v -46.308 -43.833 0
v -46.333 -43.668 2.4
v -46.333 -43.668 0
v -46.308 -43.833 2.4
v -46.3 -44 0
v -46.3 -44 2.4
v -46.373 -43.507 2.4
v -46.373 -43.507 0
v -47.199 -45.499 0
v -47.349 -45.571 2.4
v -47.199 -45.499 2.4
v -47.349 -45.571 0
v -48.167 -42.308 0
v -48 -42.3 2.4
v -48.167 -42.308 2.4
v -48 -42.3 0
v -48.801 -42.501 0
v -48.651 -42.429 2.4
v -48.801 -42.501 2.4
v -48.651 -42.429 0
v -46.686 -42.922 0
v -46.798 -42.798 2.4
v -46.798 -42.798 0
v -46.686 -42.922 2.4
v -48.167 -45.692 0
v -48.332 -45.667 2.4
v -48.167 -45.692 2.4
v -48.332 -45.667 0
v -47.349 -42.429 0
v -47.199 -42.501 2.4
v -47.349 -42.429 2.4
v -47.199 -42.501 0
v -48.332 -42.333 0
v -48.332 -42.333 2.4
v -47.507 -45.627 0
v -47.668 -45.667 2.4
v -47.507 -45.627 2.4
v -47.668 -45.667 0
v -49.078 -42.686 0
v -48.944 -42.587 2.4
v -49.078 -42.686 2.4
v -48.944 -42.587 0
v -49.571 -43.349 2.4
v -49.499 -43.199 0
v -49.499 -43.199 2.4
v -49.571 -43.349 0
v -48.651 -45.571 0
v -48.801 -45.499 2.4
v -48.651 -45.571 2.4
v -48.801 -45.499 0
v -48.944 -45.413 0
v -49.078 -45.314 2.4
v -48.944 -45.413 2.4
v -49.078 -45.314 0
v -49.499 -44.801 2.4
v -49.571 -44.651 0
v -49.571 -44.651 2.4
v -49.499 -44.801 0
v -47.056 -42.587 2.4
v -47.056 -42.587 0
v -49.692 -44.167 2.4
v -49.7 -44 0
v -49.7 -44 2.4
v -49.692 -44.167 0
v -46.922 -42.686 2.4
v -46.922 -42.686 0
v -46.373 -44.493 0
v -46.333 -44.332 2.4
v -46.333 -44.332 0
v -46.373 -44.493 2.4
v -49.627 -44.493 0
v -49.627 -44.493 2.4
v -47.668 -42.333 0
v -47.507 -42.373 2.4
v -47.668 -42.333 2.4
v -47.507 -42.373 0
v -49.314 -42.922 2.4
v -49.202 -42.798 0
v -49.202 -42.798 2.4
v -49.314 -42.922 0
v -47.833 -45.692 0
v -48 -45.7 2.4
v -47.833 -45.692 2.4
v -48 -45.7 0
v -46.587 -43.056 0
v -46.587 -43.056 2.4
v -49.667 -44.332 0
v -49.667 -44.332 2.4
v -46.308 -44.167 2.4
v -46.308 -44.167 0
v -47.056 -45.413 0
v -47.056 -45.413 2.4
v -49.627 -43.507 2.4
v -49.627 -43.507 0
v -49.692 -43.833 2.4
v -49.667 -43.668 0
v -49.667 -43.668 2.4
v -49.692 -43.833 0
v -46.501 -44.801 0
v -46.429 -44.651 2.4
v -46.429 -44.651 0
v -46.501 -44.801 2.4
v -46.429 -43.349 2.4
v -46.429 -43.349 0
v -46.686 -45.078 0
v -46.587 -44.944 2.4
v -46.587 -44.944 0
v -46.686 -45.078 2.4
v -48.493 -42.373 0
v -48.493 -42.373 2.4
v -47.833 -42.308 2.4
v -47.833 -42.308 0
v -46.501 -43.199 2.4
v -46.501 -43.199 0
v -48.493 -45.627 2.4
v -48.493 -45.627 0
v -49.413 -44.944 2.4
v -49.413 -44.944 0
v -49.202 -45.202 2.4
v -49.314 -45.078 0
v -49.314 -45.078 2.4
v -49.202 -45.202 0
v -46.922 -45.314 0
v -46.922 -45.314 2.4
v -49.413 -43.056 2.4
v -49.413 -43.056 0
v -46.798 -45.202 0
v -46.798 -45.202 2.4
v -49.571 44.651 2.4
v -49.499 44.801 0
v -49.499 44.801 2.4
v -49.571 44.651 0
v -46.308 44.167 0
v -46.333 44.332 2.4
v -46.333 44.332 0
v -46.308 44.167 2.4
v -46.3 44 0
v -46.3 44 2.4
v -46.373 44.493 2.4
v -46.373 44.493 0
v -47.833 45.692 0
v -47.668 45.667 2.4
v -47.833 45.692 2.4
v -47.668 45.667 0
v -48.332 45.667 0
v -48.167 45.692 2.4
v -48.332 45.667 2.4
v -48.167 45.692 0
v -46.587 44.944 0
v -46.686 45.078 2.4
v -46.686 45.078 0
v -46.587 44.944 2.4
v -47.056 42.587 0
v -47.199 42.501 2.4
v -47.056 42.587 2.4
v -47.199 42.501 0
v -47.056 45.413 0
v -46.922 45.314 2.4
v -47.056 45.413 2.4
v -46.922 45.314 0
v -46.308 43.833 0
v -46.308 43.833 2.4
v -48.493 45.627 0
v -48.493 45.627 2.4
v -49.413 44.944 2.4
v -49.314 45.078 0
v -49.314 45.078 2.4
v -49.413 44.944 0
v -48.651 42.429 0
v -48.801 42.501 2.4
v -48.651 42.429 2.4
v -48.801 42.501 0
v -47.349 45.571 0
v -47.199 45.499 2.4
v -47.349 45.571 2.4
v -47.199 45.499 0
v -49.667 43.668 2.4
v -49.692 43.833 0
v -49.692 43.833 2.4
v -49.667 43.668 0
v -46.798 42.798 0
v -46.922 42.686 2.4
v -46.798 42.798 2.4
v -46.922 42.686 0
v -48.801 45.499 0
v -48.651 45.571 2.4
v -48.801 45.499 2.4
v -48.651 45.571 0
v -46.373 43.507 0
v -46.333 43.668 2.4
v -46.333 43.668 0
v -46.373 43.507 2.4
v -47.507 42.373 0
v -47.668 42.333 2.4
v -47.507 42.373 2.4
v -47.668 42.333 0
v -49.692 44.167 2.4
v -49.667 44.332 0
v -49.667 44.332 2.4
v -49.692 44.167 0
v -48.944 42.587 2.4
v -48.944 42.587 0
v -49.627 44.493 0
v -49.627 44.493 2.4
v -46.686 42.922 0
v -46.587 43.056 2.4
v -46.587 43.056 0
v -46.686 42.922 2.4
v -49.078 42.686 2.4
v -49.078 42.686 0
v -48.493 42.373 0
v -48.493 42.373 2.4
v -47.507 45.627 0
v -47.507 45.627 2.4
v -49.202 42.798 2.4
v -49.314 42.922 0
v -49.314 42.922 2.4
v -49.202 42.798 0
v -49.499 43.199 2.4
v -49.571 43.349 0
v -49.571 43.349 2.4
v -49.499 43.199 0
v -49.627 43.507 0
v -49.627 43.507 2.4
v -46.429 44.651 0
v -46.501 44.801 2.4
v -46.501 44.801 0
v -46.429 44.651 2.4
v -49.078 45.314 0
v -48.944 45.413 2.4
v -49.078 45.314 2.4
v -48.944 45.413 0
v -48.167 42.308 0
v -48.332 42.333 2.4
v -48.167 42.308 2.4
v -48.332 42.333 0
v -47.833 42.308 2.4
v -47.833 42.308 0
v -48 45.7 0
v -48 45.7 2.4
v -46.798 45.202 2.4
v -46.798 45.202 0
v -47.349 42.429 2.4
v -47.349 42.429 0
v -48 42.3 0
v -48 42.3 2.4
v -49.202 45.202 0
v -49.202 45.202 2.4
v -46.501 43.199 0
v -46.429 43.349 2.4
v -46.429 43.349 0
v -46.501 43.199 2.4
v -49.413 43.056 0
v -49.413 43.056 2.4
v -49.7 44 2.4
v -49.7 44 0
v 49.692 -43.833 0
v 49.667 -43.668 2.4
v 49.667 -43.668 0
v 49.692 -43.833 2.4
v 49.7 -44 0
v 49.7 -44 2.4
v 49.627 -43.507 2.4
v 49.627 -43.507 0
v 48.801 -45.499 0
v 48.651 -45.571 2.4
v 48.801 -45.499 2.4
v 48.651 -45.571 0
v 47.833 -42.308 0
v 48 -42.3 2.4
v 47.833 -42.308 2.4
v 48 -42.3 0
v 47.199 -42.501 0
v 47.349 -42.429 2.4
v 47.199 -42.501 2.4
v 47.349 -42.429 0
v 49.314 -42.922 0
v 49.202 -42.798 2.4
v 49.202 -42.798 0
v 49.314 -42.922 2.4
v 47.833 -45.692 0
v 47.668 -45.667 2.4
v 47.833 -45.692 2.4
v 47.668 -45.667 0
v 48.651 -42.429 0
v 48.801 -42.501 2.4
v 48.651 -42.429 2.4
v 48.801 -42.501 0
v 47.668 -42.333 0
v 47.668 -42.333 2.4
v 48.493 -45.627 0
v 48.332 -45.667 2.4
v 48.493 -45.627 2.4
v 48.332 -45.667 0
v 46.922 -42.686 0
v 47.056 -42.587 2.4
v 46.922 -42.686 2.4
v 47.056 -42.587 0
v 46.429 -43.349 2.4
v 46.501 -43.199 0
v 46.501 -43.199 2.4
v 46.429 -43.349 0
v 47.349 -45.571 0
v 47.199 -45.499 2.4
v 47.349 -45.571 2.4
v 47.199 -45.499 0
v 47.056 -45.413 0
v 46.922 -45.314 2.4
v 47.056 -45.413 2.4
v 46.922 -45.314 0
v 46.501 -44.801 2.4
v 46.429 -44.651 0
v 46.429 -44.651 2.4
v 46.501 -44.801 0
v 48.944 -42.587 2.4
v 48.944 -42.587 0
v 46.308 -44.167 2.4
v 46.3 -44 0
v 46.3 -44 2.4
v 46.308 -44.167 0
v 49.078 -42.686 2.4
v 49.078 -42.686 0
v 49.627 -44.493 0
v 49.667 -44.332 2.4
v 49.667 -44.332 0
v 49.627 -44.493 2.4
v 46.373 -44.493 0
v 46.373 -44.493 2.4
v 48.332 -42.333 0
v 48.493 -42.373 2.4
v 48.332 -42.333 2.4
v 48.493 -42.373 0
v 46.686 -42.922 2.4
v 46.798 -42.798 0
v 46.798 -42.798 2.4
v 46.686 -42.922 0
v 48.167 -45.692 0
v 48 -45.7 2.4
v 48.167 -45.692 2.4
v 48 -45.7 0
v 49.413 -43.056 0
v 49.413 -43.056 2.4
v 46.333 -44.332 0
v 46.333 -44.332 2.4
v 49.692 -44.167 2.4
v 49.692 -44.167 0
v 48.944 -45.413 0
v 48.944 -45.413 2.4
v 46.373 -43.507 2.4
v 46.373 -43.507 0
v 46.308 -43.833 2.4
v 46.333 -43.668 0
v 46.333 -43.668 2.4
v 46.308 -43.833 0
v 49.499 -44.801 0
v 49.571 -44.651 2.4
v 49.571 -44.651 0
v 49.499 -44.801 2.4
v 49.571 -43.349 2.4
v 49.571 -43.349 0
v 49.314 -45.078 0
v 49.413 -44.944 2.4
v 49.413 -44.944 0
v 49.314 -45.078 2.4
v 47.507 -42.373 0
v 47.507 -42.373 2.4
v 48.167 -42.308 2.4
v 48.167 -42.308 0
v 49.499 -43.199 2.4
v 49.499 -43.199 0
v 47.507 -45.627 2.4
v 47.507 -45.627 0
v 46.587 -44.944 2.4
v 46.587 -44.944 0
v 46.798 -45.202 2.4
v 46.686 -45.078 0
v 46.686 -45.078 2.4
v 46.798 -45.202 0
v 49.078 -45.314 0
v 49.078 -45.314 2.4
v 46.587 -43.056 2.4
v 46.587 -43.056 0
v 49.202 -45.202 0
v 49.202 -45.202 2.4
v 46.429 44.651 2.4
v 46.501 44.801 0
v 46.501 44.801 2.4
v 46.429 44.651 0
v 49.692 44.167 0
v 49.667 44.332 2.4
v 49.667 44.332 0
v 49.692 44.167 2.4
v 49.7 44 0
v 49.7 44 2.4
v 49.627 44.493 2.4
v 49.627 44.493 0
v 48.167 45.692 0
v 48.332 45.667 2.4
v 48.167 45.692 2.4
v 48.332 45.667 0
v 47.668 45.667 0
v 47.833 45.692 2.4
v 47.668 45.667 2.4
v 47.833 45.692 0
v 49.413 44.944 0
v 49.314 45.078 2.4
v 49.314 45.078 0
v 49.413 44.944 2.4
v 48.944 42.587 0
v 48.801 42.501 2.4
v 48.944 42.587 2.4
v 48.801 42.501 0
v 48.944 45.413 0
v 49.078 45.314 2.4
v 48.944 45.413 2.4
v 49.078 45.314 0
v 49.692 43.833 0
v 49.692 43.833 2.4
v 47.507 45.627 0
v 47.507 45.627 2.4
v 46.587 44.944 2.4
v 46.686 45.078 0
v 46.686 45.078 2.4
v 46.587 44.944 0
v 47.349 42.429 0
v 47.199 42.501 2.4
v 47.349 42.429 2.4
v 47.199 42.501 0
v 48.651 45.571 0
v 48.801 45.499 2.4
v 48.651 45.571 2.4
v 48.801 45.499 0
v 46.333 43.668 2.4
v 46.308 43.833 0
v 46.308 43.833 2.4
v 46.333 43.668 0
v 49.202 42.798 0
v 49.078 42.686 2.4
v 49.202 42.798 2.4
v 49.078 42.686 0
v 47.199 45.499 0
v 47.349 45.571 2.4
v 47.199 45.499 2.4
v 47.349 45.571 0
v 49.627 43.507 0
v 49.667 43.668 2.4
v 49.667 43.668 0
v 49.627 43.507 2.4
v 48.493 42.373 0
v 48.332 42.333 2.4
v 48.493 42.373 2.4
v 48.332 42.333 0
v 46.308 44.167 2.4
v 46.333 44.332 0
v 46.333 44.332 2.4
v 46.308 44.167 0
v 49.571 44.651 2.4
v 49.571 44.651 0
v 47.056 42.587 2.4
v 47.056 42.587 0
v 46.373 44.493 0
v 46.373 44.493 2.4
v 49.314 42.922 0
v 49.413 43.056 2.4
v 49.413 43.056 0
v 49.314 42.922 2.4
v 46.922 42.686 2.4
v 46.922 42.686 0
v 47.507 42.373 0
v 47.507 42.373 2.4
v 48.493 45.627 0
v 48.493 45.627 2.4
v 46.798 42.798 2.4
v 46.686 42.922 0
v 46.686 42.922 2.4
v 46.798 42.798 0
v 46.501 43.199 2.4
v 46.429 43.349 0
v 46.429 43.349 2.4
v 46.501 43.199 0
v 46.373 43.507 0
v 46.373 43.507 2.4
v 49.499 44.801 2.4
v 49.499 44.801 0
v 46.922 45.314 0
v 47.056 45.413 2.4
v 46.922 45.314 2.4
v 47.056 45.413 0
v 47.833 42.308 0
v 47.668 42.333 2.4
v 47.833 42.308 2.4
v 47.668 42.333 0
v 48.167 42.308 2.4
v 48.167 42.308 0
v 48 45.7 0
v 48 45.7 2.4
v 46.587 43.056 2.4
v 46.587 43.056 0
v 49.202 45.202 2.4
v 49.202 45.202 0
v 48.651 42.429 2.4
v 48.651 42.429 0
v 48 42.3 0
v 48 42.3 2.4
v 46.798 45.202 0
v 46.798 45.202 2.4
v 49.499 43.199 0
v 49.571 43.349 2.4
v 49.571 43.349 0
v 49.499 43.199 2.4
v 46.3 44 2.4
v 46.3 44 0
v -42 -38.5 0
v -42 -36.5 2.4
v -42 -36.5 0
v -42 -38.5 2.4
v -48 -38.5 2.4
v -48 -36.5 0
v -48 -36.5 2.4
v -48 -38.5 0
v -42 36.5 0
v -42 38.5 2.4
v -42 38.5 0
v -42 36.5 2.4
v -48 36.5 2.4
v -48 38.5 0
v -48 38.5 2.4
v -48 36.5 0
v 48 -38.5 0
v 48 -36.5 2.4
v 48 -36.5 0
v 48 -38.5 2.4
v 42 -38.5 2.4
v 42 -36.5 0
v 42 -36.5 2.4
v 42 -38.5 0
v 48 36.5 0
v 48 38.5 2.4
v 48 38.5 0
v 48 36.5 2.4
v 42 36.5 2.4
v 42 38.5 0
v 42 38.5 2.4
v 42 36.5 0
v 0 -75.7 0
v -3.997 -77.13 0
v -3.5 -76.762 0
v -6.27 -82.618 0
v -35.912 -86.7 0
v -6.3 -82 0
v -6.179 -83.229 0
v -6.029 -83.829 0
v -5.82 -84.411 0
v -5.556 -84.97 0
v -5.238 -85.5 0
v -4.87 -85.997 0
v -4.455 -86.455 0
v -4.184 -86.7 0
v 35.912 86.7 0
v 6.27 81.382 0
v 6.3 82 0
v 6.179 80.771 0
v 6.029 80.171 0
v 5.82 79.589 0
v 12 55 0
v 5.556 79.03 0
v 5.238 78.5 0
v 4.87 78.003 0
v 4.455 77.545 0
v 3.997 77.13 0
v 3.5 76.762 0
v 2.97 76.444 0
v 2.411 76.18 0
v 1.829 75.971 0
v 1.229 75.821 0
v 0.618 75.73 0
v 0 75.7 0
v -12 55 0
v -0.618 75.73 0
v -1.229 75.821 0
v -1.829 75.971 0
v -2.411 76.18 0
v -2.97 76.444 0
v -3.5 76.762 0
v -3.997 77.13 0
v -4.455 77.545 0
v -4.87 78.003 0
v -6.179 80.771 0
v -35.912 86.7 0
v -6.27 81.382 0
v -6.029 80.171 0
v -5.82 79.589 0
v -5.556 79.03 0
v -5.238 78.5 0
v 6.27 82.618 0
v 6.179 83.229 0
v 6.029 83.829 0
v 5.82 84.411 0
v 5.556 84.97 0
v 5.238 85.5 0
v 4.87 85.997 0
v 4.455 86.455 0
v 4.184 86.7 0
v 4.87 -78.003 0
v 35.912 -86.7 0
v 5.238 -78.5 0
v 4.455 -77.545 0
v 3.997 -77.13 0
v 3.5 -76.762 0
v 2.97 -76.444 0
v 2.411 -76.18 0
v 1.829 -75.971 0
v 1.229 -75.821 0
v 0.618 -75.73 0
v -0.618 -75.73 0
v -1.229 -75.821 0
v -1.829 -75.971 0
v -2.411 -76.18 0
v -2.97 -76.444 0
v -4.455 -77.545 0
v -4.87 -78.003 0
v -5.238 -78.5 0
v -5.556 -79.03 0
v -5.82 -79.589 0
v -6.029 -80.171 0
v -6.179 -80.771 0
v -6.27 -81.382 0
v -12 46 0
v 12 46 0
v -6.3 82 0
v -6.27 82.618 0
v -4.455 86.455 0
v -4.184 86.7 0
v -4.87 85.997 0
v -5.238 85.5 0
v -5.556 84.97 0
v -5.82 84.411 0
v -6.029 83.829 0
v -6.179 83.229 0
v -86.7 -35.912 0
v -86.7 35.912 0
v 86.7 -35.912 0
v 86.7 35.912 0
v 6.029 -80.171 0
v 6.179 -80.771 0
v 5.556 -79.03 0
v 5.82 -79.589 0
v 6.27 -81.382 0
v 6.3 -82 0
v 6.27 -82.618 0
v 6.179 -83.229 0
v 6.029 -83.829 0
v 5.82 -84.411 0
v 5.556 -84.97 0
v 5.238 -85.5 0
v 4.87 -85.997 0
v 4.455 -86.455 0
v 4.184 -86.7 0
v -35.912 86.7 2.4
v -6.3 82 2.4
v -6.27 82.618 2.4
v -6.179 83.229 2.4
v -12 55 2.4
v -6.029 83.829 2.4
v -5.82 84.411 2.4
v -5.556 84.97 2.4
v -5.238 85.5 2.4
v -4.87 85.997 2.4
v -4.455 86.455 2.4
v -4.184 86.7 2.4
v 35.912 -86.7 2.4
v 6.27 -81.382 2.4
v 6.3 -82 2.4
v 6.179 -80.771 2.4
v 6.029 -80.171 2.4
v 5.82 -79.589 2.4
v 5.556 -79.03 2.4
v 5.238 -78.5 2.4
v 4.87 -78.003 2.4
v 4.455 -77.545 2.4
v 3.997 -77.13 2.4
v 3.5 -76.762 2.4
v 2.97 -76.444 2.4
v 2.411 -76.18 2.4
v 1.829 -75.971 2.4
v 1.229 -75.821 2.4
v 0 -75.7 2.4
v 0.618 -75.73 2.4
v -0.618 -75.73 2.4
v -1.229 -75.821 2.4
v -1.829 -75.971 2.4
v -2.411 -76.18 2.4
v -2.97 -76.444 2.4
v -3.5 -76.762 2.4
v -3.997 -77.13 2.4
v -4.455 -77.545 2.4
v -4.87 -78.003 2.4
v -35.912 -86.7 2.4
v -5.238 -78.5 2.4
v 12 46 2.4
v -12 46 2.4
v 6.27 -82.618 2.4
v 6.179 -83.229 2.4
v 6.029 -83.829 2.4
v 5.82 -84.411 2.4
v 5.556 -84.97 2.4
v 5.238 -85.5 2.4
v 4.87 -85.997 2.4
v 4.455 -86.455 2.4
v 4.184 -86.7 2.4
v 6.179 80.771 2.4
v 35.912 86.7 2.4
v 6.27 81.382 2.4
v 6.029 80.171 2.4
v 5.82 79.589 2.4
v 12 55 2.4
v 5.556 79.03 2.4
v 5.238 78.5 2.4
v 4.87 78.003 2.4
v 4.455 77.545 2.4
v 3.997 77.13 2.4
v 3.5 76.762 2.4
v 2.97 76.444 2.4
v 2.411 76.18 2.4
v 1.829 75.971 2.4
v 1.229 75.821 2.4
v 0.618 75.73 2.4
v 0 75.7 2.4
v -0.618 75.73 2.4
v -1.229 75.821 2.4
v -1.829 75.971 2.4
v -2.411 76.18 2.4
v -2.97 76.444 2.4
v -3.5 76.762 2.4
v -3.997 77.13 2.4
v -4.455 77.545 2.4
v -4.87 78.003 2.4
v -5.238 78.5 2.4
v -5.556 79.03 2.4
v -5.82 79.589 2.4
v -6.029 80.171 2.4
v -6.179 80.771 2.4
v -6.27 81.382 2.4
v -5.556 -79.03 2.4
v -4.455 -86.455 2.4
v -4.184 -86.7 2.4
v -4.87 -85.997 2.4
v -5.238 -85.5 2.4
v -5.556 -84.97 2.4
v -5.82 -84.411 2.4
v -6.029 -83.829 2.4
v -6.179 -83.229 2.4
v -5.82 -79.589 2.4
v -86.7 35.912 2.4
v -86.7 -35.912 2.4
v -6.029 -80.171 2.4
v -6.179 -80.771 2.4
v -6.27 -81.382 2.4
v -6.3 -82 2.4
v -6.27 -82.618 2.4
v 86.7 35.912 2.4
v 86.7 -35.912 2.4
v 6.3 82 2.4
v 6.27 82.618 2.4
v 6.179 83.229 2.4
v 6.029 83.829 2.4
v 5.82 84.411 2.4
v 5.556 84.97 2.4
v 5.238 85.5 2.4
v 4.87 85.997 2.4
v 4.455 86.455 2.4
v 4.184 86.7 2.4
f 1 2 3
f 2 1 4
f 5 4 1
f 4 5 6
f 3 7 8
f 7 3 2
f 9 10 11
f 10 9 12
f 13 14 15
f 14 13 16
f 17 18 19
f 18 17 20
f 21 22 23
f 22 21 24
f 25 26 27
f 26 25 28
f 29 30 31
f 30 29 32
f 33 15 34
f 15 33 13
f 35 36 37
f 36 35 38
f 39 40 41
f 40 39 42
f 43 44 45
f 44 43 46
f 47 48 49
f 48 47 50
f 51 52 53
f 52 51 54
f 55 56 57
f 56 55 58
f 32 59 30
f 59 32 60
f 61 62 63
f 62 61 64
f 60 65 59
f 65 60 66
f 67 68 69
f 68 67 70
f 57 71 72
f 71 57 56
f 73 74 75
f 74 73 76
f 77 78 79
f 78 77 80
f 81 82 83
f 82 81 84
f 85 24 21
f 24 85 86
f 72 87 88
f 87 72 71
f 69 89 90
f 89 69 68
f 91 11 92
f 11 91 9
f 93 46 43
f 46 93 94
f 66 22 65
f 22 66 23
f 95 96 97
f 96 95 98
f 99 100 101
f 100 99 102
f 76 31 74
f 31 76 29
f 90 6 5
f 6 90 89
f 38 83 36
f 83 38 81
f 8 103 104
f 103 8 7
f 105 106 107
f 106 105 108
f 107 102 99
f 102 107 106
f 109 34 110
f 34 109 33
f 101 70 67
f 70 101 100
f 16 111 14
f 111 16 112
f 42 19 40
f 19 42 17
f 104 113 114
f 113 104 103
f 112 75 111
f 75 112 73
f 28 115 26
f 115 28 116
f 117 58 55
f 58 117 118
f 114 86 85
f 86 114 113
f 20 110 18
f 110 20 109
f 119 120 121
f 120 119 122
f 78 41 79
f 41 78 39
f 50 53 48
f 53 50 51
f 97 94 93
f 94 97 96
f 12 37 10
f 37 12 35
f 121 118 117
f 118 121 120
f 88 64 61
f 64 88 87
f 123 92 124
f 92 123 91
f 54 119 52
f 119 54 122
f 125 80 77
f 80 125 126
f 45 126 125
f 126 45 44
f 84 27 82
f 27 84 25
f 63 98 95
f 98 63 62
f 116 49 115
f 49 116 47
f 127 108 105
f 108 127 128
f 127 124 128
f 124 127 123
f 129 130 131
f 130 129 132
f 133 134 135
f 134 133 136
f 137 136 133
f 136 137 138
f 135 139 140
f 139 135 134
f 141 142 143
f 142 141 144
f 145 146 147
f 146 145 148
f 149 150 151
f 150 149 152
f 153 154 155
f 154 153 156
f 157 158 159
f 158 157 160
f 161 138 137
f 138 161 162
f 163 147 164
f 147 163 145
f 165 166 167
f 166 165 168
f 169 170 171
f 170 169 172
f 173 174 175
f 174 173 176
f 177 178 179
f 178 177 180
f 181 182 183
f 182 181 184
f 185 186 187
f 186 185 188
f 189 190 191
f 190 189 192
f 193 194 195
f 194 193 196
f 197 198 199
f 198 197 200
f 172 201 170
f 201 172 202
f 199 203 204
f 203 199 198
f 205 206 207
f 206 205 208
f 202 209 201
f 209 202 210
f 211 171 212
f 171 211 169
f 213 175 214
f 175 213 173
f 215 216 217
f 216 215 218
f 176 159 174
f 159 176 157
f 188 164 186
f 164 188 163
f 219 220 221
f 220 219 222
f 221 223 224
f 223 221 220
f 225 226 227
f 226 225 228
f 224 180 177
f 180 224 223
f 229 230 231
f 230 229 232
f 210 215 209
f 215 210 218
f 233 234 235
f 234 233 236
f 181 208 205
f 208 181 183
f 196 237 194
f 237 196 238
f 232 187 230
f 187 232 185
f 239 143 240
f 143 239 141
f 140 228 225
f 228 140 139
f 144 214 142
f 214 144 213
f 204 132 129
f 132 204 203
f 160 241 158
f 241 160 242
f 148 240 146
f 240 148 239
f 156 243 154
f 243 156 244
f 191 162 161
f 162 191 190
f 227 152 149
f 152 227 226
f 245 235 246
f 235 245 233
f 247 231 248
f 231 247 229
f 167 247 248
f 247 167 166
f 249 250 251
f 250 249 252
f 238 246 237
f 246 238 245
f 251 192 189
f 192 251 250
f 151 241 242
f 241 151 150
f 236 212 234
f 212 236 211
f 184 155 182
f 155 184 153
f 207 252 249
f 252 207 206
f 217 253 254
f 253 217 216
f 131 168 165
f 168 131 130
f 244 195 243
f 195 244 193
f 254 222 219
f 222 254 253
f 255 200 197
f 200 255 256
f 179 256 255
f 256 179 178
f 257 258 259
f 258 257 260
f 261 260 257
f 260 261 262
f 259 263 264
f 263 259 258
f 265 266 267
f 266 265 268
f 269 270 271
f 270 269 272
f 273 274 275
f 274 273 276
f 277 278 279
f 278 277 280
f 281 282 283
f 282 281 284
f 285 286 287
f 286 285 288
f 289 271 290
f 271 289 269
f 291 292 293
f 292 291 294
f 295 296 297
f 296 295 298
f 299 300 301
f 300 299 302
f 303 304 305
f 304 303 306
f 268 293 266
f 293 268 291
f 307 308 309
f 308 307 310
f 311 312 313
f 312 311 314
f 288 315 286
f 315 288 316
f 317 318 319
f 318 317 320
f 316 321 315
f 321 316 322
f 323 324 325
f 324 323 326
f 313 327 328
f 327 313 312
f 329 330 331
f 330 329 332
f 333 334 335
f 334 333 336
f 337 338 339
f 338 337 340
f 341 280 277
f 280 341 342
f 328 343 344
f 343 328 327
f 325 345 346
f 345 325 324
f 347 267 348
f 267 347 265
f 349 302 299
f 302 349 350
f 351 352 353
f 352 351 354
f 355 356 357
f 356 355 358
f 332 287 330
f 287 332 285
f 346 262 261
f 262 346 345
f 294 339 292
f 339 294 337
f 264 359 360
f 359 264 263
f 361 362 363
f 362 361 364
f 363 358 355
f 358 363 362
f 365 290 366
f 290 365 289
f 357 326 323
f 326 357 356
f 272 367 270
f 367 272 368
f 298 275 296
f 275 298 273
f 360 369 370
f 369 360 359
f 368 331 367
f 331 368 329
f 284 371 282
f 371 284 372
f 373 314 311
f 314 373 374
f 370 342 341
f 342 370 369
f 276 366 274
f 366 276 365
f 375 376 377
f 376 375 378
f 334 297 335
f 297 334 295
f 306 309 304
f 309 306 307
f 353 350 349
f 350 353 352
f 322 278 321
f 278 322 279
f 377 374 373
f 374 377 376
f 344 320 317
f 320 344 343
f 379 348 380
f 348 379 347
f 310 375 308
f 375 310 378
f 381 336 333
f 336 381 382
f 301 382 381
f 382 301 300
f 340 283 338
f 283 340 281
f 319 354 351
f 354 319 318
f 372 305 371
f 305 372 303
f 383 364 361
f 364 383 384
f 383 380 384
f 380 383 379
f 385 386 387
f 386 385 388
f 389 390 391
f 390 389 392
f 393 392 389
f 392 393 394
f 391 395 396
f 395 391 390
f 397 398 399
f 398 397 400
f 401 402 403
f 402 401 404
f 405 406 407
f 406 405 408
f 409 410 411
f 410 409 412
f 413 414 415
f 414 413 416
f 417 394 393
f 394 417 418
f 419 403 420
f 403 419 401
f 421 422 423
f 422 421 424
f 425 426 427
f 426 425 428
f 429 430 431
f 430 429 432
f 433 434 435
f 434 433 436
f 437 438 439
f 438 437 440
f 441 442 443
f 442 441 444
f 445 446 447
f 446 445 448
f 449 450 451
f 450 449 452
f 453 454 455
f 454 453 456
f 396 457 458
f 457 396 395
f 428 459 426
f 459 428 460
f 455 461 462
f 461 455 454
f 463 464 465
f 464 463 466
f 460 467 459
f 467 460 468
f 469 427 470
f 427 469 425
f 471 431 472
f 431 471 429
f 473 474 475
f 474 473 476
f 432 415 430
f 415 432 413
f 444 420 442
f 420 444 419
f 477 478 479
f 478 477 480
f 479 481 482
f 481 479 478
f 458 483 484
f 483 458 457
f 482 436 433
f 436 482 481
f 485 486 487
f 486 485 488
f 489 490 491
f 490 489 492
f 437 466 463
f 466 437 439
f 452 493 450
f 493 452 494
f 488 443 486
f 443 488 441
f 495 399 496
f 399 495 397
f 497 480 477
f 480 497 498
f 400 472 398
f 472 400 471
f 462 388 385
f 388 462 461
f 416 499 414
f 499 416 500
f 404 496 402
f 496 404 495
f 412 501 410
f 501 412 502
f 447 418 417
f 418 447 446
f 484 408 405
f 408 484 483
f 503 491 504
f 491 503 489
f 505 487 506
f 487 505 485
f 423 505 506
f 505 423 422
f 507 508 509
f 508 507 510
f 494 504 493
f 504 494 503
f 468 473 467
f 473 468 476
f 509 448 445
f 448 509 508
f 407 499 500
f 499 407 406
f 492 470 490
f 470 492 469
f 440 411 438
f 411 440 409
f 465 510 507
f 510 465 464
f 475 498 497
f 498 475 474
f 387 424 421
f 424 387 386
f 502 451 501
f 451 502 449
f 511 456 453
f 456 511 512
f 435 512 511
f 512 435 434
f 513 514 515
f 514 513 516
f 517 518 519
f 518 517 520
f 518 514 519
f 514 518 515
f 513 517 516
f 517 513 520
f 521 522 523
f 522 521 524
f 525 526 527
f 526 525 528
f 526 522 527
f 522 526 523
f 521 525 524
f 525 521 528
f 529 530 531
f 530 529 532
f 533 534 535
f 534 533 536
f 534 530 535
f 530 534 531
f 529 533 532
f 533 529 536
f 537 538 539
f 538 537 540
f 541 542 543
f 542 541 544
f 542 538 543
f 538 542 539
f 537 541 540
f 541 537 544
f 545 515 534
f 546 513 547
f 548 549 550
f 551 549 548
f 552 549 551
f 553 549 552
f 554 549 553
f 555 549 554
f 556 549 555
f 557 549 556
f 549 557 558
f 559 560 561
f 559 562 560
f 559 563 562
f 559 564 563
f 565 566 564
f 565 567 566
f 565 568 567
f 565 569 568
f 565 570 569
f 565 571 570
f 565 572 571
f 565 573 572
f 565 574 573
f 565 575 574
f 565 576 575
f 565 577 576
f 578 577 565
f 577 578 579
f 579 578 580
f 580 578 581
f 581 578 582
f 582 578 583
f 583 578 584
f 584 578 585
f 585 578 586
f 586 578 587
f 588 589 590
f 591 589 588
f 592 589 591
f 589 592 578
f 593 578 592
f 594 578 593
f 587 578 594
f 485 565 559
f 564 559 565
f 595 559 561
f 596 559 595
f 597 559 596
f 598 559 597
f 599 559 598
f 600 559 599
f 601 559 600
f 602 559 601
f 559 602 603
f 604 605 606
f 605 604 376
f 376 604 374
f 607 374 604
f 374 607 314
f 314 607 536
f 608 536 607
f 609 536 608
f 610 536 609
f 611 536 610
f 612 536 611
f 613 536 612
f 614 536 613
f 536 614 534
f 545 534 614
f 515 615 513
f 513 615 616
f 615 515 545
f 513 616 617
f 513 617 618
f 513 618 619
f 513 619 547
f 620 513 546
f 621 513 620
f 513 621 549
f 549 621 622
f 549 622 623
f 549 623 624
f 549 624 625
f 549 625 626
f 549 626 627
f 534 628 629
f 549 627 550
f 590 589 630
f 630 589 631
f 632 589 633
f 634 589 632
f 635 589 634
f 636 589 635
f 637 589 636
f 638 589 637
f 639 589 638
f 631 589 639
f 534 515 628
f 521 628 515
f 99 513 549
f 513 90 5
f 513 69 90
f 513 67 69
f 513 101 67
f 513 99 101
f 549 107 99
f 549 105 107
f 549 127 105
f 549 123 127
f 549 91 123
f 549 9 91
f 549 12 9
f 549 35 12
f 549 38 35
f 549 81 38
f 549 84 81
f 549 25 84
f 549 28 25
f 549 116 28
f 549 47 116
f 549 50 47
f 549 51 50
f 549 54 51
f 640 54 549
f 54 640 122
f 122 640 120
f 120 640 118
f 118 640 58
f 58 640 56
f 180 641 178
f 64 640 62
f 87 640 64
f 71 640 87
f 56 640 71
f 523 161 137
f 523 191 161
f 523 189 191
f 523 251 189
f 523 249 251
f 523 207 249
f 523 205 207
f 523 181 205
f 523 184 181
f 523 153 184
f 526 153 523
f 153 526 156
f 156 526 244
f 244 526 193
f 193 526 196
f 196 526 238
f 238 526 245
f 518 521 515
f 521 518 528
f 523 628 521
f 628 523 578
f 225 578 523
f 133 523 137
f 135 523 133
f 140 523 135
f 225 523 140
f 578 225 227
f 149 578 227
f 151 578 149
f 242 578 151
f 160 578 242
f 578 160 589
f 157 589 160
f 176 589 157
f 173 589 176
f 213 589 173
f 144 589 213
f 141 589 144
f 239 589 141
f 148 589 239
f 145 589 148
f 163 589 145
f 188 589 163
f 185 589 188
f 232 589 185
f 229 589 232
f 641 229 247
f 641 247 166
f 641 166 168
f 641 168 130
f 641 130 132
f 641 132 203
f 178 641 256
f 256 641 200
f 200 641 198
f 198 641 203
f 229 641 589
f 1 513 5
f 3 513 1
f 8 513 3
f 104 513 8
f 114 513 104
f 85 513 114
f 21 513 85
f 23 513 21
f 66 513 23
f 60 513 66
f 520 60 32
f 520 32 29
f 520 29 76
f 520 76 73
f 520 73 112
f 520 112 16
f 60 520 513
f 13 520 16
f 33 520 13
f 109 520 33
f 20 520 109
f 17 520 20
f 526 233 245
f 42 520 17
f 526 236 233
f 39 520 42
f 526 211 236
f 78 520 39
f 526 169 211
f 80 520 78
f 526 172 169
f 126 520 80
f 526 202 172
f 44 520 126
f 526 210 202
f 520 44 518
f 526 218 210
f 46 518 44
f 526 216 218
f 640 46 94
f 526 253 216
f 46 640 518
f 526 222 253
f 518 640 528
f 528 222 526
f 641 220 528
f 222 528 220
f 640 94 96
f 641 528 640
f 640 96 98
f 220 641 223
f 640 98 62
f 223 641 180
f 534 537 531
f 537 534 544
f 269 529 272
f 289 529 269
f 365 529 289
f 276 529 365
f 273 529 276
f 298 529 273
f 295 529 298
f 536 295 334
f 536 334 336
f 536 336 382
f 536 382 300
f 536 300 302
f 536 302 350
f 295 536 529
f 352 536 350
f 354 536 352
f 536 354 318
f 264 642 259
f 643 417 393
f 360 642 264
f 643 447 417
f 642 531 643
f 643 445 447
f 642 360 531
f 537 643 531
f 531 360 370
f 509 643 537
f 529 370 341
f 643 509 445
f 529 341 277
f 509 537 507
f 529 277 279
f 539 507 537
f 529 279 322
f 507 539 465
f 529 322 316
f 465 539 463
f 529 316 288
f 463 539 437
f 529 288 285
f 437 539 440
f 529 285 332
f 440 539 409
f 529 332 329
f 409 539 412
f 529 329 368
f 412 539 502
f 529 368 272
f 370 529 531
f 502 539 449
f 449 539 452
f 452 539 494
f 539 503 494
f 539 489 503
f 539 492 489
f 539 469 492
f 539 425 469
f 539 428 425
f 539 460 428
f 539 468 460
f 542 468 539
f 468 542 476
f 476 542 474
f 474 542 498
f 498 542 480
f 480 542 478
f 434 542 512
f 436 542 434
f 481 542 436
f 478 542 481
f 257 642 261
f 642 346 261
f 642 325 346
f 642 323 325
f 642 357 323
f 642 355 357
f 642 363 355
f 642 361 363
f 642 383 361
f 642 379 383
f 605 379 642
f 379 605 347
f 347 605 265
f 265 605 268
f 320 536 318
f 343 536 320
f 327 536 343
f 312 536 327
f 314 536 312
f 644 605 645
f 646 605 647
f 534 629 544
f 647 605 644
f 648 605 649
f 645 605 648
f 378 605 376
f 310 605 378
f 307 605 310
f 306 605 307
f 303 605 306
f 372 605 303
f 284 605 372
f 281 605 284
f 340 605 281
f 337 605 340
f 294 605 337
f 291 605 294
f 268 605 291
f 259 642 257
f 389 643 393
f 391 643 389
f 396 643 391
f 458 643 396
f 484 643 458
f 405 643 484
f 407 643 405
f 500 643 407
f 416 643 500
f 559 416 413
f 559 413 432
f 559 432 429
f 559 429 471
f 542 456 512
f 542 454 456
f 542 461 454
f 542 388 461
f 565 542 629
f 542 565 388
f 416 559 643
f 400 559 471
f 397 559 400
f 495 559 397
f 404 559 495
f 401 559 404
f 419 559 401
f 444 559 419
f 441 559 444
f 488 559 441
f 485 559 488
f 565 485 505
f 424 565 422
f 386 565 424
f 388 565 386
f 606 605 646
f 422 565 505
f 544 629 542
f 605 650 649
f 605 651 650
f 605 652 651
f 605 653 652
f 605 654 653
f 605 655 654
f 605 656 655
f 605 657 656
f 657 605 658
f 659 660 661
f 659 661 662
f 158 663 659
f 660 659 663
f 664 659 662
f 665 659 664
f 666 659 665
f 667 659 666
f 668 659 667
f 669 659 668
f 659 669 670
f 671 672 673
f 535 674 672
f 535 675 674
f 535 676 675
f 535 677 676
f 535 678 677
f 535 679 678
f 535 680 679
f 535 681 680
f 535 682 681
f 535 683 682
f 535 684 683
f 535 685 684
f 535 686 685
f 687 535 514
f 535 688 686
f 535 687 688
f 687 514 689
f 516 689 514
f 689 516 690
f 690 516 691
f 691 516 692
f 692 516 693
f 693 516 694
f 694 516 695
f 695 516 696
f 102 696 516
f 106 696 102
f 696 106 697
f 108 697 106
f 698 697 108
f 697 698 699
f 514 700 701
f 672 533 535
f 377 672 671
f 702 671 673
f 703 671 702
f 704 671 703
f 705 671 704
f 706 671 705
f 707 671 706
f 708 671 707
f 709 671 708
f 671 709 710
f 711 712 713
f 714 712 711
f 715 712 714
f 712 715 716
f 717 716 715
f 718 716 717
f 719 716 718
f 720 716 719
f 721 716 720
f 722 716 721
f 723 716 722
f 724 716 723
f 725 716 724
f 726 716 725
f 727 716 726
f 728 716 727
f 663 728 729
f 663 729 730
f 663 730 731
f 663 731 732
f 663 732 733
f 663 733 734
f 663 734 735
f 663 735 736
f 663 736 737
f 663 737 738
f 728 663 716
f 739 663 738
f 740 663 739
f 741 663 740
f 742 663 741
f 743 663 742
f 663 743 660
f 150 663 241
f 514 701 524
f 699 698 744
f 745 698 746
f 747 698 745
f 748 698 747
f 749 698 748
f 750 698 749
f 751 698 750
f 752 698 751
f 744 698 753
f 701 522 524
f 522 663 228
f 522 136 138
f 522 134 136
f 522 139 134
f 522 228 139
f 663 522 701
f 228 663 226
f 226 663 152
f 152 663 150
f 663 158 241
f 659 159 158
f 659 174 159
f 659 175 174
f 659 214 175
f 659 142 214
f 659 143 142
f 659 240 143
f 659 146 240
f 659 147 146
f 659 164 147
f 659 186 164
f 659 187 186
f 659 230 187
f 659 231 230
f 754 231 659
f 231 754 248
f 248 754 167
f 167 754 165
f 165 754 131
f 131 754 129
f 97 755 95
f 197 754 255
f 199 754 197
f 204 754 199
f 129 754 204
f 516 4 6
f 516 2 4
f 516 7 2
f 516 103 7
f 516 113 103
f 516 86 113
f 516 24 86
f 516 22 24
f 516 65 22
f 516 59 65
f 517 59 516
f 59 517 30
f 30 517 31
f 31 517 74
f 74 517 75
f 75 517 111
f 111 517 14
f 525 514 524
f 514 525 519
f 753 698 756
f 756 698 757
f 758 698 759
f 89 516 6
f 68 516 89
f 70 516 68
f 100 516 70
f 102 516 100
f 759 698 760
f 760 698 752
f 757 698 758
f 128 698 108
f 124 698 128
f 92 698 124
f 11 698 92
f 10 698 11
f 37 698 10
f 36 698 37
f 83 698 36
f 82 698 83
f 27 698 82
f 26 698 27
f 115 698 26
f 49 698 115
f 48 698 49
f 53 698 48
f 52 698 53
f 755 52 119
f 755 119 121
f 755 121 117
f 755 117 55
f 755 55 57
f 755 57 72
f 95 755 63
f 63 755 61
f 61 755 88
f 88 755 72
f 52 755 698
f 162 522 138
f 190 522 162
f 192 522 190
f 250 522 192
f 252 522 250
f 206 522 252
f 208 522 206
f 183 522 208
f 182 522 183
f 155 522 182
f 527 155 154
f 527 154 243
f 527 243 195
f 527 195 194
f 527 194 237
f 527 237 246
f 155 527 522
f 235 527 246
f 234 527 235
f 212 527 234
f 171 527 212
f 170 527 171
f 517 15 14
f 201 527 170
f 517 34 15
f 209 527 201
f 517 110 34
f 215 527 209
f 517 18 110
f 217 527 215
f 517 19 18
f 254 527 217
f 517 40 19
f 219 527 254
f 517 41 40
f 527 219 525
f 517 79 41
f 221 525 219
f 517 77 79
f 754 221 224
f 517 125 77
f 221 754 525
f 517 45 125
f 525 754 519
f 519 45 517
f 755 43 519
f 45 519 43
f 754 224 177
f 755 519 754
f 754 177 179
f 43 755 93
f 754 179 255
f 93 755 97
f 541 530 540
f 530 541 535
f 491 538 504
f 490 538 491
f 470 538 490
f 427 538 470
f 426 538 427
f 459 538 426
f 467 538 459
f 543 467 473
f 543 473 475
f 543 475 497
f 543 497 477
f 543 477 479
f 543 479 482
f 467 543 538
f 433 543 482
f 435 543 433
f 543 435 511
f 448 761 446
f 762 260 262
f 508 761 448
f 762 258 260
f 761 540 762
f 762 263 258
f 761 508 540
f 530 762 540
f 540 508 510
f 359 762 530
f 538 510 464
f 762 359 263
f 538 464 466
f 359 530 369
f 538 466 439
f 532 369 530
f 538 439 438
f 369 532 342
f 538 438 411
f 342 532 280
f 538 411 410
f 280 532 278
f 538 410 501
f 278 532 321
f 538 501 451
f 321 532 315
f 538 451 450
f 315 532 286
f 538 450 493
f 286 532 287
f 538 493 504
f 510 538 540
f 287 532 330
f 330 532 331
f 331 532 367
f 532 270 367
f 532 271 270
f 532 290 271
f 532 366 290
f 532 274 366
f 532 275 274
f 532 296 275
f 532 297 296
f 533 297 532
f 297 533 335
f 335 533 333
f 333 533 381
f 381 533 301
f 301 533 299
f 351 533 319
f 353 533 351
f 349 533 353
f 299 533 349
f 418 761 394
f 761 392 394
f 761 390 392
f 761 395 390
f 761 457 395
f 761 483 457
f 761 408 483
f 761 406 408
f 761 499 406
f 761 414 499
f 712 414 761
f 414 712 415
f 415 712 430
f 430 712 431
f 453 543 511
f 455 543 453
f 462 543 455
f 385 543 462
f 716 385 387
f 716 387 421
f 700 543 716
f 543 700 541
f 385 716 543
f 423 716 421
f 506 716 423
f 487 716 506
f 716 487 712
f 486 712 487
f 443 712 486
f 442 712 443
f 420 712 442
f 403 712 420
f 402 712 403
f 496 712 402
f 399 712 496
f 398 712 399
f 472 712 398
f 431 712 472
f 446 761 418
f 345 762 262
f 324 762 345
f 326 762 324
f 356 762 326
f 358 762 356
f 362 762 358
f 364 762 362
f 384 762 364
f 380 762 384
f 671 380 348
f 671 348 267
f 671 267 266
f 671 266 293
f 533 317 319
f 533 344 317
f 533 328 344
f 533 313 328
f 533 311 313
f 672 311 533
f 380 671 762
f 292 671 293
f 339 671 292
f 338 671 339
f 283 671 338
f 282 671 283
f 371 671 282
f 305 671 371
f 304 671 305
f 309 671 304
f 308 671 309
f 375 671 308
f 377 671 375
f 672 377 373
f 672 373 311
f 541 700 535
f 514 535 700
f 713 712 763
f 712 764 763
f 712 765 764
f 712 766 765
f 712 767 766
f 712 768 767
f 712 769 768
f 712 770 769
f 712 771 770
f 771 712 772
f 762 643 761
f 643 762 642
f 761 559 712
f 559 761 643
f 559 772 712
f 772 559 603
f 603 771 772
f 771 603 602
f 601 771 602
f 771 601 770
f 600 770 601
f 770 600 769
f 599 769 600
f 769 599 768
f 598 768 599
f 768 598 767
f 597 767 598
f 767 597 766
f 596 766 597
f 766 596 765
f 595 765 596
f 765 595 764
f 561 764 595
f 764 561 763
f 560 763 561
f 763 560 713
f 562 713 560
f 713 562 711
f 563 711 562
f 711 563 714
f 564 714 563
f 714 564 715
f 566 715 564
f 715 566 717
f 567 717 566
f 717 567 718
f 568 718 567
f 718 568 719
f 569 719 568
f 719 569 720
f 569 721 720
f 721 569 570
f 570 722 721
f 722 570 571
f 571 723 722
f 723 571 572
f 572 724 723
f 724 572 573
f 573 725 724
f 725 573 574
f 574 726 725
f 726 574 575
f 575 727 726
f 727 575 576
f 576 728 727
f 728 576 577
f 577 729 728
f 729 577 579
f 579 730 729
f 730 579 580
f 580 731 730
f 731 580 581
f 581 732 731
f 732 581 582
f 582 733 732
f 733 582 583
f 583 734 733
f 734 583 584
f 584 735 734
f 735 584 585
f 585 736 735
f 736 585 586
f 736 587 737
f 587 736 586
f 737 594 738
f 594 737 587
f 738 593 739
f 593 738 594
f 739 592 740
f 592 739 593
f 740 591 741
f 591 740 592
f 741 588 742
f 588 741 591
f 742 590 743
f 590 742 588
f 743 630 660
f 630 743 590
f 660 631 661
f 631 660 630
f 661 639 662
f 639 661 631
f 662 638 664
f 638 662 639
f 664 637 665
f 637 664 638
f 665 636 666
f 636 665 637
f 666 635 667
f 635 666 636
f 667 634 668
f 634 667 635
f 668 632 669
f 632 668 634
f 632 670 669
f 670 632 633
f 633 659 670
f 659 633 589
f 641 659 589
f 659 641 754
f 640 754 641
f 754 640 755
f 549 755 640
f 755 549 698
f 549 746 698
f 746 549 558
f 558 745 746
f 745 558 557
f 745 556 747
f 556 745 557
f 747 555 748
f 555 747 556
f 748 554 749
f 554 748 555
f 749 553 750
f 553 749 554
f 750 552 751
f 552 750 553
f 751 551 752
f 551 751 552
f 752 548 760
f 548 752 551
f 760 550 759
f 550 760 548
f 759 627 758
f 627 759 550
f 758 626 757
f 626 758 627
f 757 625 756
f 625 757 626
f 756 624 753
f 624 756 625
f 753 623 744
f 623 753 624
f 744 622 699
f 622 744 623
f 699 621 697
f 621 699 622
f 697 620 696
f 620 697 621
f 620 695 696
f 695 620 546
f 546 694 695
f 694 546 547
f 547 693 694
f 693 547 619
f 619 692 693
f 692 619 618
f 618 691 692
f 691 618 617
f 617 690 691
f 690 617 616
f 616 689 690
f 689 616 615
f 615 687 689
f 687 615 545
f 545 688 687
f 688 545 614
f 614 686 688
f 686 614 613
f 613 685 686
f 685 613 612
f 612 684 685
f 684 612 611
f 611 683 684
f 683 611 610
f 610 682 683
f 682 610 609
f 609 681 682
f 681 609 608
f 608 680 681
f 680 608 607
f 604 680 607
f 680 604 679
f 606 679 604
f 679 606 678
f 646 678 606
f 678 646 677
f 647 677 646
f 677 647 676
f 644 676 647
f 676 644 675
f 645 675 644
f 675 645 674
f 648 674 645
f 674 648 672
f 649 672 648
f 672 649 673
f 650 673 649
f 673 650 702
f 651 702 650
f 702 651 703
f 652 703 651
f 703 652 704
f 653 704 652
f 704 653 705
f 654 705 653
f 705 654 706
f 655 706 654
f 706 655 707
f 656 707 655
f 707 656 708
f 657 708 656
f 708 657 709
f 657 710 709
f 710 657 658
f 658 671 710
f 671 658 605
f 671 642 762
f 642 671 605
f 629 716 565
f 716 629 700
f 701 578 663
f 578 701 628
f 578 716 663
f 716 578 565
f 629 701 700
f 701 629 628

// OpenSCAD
// 正八角形の電子鈴 / mm / OpenSCAD 2021.01以上 / 外部ライブラリ不要
// STL出力時は body, lid, tray, shelf, ball のいずれかを指定。
/* [Display] */
part = "shelf"; // [assembly,section,exploded,print,body,lid,tray,shelf,ball]
show_electronics = true;
/* [Electronics space] */
electronics_clearance = 30; // トレー上面から電池棚下面までの有効高さ
/* [Hidden] */
electronics_height_extra = electronics_clearance-16.6; // 元の基板空間から増えた高さ
/* [Shell] */
body_width = 180; // 正八角形の対辺。画像の150mmから収納余裕のため拡大。
wall = 3;
bottom_width = 100;
top_width = 104;
bevel_height = 28;
shoulder_z = 88+electronics_height_extra;
roof_z = 113+electronics_height_extra;
seam_z = 78+electronics_height_extra;
seam_gap = 0.35;
fit = 0.3; // はめ合わせ片側余裕
/* [Rope and sound] */
lug_width = 38;
lug_thickness = 14;
lug_height = 22;
rope_hole_width = 19;
rope_hole_height = 14;
sound_slit = 4;
sound_end_d = 10;
sound_length = 90; // 底面の音穴全長（両端の丸穴を含む）
ball_d = 25;
/* [Electronics - reference envelopes] */
battery = [135.5,69,16];
esp32 = [52,28,12];
mpu6050 = [21,16,5];
/* [Tray fasteners] */
tray_screw_d = 3.4; // M3ねじの貫通穴。電池棚も同径。
tray_nut_af = 6.0; // M3六角ナット用くぼみの対辺（想定ナット対辺5.5）
tray_nut_depth = 2.6; // トレー裏面からの深さ（想定ナット厚2.4）
/* [Lid fasteners] */
lid_screw_length = 35; // 棚の固定ねじとM3x35に統一（頭の下からの長さ）
lid_screw_d = 3.4; // M3ねじ用の通し穴
lid_nut_af = 6.0; // 横差しナット受けの対辺（想定ナット対辺5.5）
lid_nut_height = 2.8; // 想定ナット厚2.4に挿入余裕を追加
/* [Hidden] */
lid_nut_roof = lid_screw_length-16; // M3x35で合わせ面から19mm下
$fn = 64;
eps = 0.02;
plate_t = 2.4;
tray_z = 48; // 鈴玉の空間を維持
shelf_z = tray_z+plate_t+electronics_clearance;
screw_y = body_width/2-8;
inner_width = body_width-2*wall;
tray_width = inner_width-2*fit;
assert(wall >= 2 && wall <= 4);
assert(battery[0]+battery[1]+4 < inner_width*sqrt(2), "電池と八角形の角が干渉します。body_widthを増やしてください。");
assert(battery[0]+2 < inner_width);
assert(shelf_z+plate_t+battery[2] < shoulder_z-wall+2, "電池上面と肩の高さを確認してください。");
assert(ball_d+wall+3 < tray_z);
assert(electronics_clearance > 0);
assert(tray_z-3 >= bevel_height+wall,
       "トレー受けが底面の傾斜部に干渉します。隙間を減らすか外装の高さを調整してください。");
assert(sound_slit < ball_d && sound_end_d < ball_d);
assert(sound_length > sound_end_d && sound_length < bottom_width-2*wall);
assert(rope_hole_width+10 <= lug_width && rope_hole_height+8 <= lug_height);
assert(tray_screw_d > 0 && tray_screw_d < tray_nut_af);
assert(tray_nut_af/cos(30) < 9, "ナットくぼみが支柱の外径を超えます。");
assert(tray_nut_depth > 0 && tray_nut_depth < shelf_z-tray_z);
assert(lid_screw_d > 0 && lid_screw_d < lid_nut_af);
assert(lid_nut_af/cos(30) < 12);
assert(lid_nut_roof >= 3 && lid_nut_height >= 2.4);
assert(lid_nut_roof+lid_nut_height < lid_screw_length-12,
       "ねじ先端がナット下面を通過するようナット受けの深さを調整してください。");
assert(seam_z-(lid_screw_length-8) > 45,
       "ねじの逃げ穴が固定部の底面を超えます。");
assert(seam_z-lid_nut_roof-lid_nut_height > shelf_z+plate_t ||
       seam_z-lid_nut_roof < shelf_z,
       "ナットの挿入口が電池棚にかかります。");

module oct2(w) { rotate(22.5) circle(d=w/cos(22.5),$fn=8); }
module slice(w,z) { translate([0,0,z]) linear_extrude(eps) oct2(w); }
module taper(w1,z1,w2,z2) { hull() { slice(w1,z1); slice(w2,z2); } }
module outer() {
    union() {
        taper(bottom_width,0,body_width,bevel_height);
        taper(body_width,bevel_height,body_width,shoulder_z);
        taper(body_width,shoulder_z,top_width,roof_z);
    }
}
module cavity() {
    union() {
        taper(bottom_width-2*wall,wall,inner_width,bevel_height+wall);
        taper(inner_width,bevel_height+wall,inner_width,shoulder_z-wall);
        taper(inner_width,shoulder_z-wall,top_width-2*wall,roof_z-wall);
    }
}
module shell() { difference() { outer(); cavity(); } }
module zclip(lo,hi) { translate([-200,-200,lo]) cube([400,400,hi-lo]); }
module sound_hole() {
    // 底面中央を上下方向に貫通。前後に延びるスリットと両端の丸穴。
    end_y = (sound_length-sound_end_d)/2;
    translate([0,0,-eps]) linear_extrude(wall+2*eps) union() {
        for(y=[-end_y,end_y]) translate([0,y]) circle(d=sound_end_d);
        square([sound_slit,2*end_y],center=true);
    }
}
module ring(w,t,h) {
    linear_extrude(h) difference() { oct2(w); oct2(w-2*t); }
}
module screw_positions() { for(y=[-screw_y,screw_y]) translate([0,y,0]) children(); }
// 内側から差し込む横穴。平行な側壁でナットの空回りを防ぐ。
// 外側は六角形の端で止め、外装には貫通させない。
module lid_nut_slots() {
    for(side=[-1,1])
        translate([0,side*screw_y,seam_z-lid_nut_roof-lid_nut_height])
            rotate([0,0,side==1 ? 0 : 180])
                hull() {
                    for(inward=[0,8]) translate([0,-inward,0])
                        rotate([0,0,30])
                            cylinder(d=lid_nut_af/cos(30),h=lid_nut_height,$fn=6);
                }
}
// Body専用。底面を広げ、八角形の頂点でも下部の張り出しを鉛直から45度以下にする。
// 共通のouter/cavityは変えず、蓋などの形状を維持する。
body_bottom_width = max(bottom_width,body_width-2*bevel_height*cos(22.5));
module body_shell() {
    difference() {
        intersection() {
            union() {
                taper(body_bottom_width,0,body_width,bevel_height);
                taper(body_width,bevel_height,body_width,seam_z);
            }
            zclip(0,seam_z);
        }
        union() {
            taper(body_bottom_width-2*wall,wall,inner_width,bevel_height+wall);
            taper(inner_width,bevel_height+wall,inner_width,seam_z+eps);
        }
    }
}
module body_tray_seat() {
    // 上面Z=48と受け幅は従来どおり。下面の4.7mmの張り出しを6mm高の斜面にする。
    seat_inner = inner_width+0.6-10;
    slope = (inner_width-seat_inner)/6;
    translate([0,0,tray_z-9]) difference() {
        linear_extrude(6+eps) oct2(inner_width+0.6);
        translate([0,0,-eps])
            linear_extrude(6+2*eps,
                scale=(seat_inner-slope*eps)/(inner_width+slope*eps))
                    oct2(inner_width+slope*eps);
    }
    translate([0,0,tray_z-3]) ring(inner_width+0.6,5,3);
}
module body_screw_bosses() {
    for(side=[-1,1]) {
        // 壁の内部から徐々に張り出す。Z=45以上の外径・位置は従来どおり。
        hull() {
            translate([0,side*(screw_y+6),33]) cylinder(r=0.2,h=eps);
            translate([0,side*screw_y,45]) cylinder(d=12,h=eps);
        }
        translate([0,side*screw_y,45]) cylinder(d=12,h=seam_z-45);
    }
}
module body_nut_bridge_relief() {
    // 穴を含む天井を一度に印刷しないための2段の逃げ。
    // 第1段は左右の壁を結ぶ最大6mmのブリッジ、第2段は前後3.4mm。
    // その上で丸穴に戻す。除去する膜はなく、ナットの前後に平らな座面を残す。
    // 各段0.3mm：この付近は積層0.2mm以下を想定。
    screw_positions() translate([0,0,seam_z-lid_nut_roof]) {
        translate([-lid_nut_af/2,-lid_screw_d/2,-eps])
            cube([lid_nut_af,lid_screw_d,0.3+eps]);
        translate([-lid_screw_d/2,-lid_screw_d/2,-eps])
            cube([lid_screw_d,lid_screw_d,0.6+eps]);
    }
}
module body() {
    difference() {
        union() {
            body_shell();
            // トレー受け。鈴室と電子機器室を分離する。
            body_tray_seat();
            body_screw_bosses();
        }
        sound_hole();
        // ナットより下までねじを通す逃げ穴。M3x35の先端は合わせ面から23mm下。
        screw_positions() translate([0,0,seam_z-(lid_screw_length-8)])
            cylinder(d=lid_screw_d,h=lid_screw_length-8+eps);
        lid_nut_slots();
        body_nut_bridge_relief();
    }
}
module lug() {
    // 穴は前後方向。上部を面取りした本体一体形状。
    translate([0,lug_thickness/2,roof_z-1]) rotate([90,0,0])
    linear_extrude(lug_thickness) difference() {
        polygon([[-lug_width/2,0],[lug_width/2,0],
                 [lug_width/2,lug_height-4],[lug_width/2-5,lug_height+1],
                 [-lug_width/2+5,lug_height+1],[-lug_width/2,lug_height-4]]);
        translate([-rope_hole_width/2,5]) square([rope_hole_width,rope_hole_height]);
    }
}
module lid() {
    difference() {
        union() {
            intersection() { shell(); zclip(seam_z+seam_gap,roof_z+eps); }
            lug();
            // 差し込みリップは胴体内壁と片側fitの隙間。
            translate([0,0,seam_z-3]) ring(inner_width-2*fit,1.8,6);
            translate([0,0,seam_z+1]) ring(inner_width+0.6,2.1+fit,2);
            screw_positions() translate([0,0,seam_z+seam_gap]) cylinder(d=12,h=15);
        }
        screw_positions() {
            translate([0,0,seam_z-4]) cylinder(d=lid_screw_d,h=60);
            translate([0,0,seam_z+12]) cylinder(d=6.6,h=60);
            // リップと下側ボスの干渉を除去
            translate([0,0,seam_z-4]) cylinder(d=12+2*fit,h=4+seam_gap);
        }
    }
}
module tray_outline() {
    difference() {
        oct2(tray_width);
        for(y=[-screw_y,screw_y]) translate([0,y]) circle(d=12+2*fit);
    }
}
module tray() {
    difference() {
        union() {
            translate([0,0,tray_z]) linear_extrude(plate_t) tray_outline();
            // 電池棚の支柱。基板の固定は結束バンド／粘着スペーサー。
            for(x=[-48,48],y=[-44,44]) translate([x,y,tray_z])
                cylinder(d=9,h=shelf_z-tray_z);
        }
        for(x=[-48,48],y=[-44,44]) {
            // 支柱とトレー底面を貫通。棚側からねじを入れ、裏面のナットで固定。
            translate([x,y,tray_z-eps])
                cylinder(d=tray_screw_d,h=shelf_z-tray_z+2*eps);
            translate([x,y,tray_z-eps])
                cylinder(d=tray_nut_af/cos(30),h=tray_nut_depth+eps,$fn=6);
        }
        // 基板用結束バンド穴
        for(x=[-48,-8,16,36],y=[-19,19])
            translate([x-2,y-1,tray_z-1]) cube([4,2,plate_t+2]);
    }
}
module shelf() {
    difference() {
        translate([0,0,shelf_z]) linear_extrude(plate_t) tray_outline();
        for(x=[-48,48],y=[-44,44]) translate([x,y,shelf_z-1]) cylinder(d=tray_screw_d,h=plate_t+2);
        // 電池を跨ぐ結束バンド用の穴
        for(x=[-45,45],y=[-battery[1]/2-3,battery[1]/2+3])
            translate([x-3,y-1,shelf_z-1]) cube([6,2,5]);
        // ケーブル通過口
        translate([-12,46,shelf_z-1]) cube([24,9,5]);
    }
}
module box_at(p,size,c) { color(c) translate(p) translate([-size[0]/2,-size[1]/2,0]) cube(size); }
module electronics(dz=0) {
    box_at([0,0,shelf_z+plate_t+dz],battery,[0.12,0.14,0.17]);
    box_at([-26,0,tray_z+plate_t+2],esp32,[0.04,0.32,0.40]);
    box_at([26,0,tray_z+plate_t+2],mpu6050,[0.02,0.35,0.65]);
}
module ball() { translate([0,0,wall+ball_d/2]) sphere(d=ball_d); }
module assembly(explode=0) {
    color([0.72,0.68,0.54]) body();
    color([0.82,0.78,0.64]) translate([0,0,explode*3]) lid();
    color([0.64,0.61,0.48]) translate([0,0,explode]) tray();
    color([0.70,0.67,0.53]) translate([0,0,explode*2]) shelf();
    color([0.86,0.63,0.18]) ball();
    if(show_electronics) translate([0,0,explode]) electronics(explode);
}
if(part=="body") body();
else if(part=="lid") translate([0,0,-(seam_z-3)]) lid();
else if(part=="tray") translate([0,0,-tray_z]) tray();
else if(part=="shelf") translate([0,0,-shelf_z]) shelf();
else if(part=="ball") translate([0,0,-wall]) ball();
else if(part=="print") {
    body();
    translate([body_width+15,0,-(seam_z-3)]) lid();
    translate([0,body_width+15,-tray_z]) tray();
    translate([body_width+15,body_width+15,-shelf_z]) shelf();
}
else if(part=="section") intersection() { assembly(); translate([-200,0,-1]) cube([400,200,300]); }
else if(part=="exploded") assembly(30);
else assembly();
